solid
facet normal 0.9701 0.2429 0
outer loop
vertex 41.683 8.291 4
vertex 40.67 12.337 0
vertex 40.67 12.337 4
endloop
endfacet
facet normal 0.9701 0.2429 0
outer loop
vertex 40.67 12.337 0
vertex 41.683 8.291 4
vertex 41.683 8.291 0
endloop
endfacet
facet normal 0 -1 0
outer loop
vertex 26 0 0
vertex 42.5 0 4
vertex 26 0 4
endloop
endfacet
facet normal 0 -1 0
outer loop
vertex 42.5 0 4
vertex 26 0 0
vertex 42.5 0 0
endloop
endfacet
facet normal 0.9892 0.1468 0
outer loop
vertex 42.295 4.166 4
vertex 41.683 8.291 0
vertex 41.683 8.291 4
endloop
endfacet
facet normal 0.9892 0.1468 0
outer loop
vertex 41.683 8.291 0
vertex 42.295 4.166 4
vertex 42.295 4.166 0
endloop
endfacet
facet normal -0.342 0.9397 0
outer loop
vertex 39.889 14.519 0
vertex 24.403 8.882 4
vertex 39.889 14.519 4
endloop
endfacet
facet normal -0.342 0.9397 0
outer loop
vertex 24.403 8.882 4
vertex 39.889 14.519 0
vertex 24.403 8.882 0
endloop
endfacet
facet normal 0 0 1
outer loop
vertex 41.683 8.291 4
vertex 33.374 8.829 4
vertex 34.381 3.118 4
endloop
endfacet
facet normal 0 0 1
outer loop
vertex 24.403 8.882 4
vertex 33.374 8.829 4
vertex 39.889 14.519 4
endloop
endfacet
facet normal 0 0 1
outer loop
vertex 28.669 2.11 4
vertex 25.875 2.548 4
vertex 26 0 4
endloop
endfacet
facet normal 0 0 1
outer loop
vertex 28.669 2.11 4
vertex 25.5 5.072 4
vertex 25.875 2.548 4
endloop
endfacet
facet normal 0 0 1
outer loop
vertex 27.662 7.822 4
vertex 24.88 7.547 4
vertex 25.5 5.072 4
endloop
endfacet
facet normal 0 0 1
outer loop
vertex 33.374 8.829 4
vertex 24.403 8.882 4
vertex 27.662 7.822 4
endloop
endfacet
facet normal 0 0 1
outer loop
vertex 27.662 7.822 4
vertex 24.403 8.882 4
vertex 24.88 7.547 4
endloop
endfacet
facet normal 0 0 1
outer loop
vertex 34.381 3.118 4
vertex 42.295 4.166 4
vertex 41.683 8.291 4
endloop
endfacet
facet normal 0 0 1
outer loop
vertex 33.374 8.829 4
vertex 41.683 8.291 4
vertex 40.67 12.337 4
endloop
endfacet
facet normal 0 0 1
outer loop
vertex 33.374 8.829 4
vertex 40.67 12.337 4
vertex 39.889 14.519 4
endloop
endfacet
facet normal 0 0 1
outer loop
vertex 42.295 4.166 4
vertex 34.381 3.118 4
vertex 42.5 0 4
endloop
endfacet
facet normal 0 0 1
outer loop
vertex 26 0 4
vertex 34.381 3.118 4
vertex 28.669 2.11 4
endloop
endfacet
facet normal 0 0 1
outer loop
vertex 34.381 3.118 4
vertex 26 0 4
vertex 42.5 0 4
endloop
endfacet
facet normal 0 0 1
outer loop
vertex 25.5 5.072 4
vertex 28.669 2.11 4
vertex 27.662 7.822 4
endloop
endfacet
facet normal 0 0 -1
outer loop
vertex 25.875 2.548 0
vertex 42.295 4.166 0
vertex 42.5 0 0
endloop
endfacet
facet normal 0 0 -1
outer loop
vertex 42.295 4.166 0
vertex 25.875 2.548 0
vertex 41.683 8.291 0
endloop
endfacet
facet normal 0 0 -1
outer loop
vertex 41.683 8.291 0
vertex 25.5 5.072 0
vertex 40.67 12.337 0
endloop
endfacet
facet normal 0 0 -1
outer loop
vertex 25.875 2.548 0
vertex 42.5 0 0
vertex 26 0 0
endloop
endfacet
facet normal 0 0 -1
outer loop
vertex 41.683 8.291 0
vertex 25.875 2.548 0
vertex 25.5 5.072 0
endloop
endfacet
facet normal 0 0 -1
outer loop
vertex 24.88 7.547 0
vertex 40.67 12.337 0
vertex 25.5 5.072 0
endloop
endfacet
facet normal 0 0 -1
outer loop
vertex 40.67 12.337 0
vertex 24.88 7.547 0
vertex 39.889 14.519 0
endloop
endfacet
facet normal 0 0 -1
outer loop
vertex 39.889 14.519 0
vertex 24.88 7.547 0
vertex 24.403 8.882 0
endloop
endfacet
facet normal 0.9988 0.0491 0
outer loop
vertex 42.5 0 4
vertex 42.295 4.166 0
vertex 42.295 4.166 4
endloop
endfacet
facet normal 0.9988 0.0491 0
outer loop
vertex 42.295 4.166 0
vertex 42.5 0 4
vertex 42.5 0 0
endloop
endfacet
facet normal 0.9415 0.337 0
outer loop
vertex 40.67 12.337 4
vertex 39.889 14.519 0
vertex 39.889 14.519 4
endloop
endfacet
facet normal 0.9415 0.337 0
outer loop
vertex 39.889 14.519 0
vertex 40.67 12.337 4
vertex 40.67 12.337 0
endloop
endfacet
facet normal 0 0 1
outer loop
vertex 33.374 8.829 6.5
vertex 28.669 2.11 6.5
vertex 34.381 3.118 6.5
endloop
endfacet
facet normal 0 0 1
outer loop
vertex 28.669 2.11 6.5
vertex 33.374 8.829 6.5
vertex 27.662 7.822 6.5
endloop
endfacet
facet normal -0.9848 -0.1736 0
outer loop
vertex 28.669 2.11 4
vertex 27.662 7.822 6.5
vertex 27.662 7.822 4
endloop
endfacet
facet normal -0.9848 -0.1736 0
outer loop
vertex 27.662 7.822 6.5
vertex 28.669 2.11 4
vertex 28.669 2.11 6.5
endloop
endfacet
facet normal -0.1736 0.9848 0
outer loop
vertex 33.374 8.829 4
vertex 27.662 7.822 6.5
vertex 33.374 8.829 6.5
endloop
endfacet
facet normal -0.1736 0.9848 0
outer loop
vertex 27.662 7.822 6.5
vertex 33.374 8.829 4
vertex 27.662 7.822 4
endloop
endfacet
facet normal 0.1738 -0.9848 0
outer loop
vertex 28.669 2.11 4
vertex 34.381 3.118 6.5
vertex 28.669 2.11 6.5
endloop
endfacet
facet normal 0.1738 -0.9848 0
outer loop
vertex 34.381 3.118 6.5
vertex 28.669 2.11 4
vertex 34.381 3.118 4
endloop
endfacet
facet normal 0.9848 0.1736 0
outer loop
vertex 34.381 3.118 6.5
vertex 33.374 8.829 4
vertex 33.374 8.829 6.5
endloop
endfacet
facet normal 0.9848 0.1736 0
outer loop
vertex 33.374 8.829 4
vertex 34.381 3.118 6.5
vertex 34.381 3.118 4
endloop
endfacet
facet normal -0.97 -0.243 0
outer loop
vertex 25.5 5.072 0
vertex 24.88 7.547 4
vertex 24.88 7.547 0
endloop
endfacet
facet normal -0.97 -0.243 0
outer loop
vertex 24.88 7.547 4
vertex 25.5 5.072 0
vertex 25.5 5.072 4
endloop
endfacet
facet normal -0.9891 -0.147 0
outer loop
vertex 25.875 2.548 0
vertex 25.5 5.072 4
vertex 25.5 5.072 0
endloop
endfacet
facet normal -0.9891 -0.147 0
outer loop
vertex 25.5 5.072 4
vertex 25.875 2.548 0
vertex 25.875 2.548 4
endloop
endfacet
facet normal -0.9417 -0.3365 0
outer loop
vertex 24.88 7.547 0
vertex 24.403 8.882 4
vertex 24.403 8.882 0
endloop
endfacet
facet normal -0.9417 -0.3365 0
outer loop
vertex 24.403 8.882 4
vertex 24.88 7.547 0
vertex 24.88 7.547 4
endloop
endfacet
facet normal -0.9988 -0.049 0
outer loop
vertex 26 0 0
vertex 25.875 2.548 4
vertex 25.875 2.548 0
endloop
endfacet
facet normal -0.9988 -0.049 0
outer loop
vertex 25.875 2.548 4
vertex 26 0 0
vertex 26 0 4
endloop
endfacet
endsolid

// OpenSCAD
$fn = 100;
d = 85;
sector_h = 4;

module pie_slice(r=3.0,a=30) {
  $fn=64;
  intersection() {
    circle(r=r);
    square(r);
    rotate(a-90) square(r);
  }
}


difference() {
  union() {
    linear_extrude(height = sector_h) {
      pie_slice(r=d/2, a=20);
    }
    rotate([0, 0, 10])
      translate([d/2-11, 0, sector_h])
//        cylinder(d=6.1, h=5);
        cube([5.8, 5.8, 5], center=true);
  }
    linear_extrude(height = sector_h) {
      pie_slice(r=26, a=30);
    }
}
